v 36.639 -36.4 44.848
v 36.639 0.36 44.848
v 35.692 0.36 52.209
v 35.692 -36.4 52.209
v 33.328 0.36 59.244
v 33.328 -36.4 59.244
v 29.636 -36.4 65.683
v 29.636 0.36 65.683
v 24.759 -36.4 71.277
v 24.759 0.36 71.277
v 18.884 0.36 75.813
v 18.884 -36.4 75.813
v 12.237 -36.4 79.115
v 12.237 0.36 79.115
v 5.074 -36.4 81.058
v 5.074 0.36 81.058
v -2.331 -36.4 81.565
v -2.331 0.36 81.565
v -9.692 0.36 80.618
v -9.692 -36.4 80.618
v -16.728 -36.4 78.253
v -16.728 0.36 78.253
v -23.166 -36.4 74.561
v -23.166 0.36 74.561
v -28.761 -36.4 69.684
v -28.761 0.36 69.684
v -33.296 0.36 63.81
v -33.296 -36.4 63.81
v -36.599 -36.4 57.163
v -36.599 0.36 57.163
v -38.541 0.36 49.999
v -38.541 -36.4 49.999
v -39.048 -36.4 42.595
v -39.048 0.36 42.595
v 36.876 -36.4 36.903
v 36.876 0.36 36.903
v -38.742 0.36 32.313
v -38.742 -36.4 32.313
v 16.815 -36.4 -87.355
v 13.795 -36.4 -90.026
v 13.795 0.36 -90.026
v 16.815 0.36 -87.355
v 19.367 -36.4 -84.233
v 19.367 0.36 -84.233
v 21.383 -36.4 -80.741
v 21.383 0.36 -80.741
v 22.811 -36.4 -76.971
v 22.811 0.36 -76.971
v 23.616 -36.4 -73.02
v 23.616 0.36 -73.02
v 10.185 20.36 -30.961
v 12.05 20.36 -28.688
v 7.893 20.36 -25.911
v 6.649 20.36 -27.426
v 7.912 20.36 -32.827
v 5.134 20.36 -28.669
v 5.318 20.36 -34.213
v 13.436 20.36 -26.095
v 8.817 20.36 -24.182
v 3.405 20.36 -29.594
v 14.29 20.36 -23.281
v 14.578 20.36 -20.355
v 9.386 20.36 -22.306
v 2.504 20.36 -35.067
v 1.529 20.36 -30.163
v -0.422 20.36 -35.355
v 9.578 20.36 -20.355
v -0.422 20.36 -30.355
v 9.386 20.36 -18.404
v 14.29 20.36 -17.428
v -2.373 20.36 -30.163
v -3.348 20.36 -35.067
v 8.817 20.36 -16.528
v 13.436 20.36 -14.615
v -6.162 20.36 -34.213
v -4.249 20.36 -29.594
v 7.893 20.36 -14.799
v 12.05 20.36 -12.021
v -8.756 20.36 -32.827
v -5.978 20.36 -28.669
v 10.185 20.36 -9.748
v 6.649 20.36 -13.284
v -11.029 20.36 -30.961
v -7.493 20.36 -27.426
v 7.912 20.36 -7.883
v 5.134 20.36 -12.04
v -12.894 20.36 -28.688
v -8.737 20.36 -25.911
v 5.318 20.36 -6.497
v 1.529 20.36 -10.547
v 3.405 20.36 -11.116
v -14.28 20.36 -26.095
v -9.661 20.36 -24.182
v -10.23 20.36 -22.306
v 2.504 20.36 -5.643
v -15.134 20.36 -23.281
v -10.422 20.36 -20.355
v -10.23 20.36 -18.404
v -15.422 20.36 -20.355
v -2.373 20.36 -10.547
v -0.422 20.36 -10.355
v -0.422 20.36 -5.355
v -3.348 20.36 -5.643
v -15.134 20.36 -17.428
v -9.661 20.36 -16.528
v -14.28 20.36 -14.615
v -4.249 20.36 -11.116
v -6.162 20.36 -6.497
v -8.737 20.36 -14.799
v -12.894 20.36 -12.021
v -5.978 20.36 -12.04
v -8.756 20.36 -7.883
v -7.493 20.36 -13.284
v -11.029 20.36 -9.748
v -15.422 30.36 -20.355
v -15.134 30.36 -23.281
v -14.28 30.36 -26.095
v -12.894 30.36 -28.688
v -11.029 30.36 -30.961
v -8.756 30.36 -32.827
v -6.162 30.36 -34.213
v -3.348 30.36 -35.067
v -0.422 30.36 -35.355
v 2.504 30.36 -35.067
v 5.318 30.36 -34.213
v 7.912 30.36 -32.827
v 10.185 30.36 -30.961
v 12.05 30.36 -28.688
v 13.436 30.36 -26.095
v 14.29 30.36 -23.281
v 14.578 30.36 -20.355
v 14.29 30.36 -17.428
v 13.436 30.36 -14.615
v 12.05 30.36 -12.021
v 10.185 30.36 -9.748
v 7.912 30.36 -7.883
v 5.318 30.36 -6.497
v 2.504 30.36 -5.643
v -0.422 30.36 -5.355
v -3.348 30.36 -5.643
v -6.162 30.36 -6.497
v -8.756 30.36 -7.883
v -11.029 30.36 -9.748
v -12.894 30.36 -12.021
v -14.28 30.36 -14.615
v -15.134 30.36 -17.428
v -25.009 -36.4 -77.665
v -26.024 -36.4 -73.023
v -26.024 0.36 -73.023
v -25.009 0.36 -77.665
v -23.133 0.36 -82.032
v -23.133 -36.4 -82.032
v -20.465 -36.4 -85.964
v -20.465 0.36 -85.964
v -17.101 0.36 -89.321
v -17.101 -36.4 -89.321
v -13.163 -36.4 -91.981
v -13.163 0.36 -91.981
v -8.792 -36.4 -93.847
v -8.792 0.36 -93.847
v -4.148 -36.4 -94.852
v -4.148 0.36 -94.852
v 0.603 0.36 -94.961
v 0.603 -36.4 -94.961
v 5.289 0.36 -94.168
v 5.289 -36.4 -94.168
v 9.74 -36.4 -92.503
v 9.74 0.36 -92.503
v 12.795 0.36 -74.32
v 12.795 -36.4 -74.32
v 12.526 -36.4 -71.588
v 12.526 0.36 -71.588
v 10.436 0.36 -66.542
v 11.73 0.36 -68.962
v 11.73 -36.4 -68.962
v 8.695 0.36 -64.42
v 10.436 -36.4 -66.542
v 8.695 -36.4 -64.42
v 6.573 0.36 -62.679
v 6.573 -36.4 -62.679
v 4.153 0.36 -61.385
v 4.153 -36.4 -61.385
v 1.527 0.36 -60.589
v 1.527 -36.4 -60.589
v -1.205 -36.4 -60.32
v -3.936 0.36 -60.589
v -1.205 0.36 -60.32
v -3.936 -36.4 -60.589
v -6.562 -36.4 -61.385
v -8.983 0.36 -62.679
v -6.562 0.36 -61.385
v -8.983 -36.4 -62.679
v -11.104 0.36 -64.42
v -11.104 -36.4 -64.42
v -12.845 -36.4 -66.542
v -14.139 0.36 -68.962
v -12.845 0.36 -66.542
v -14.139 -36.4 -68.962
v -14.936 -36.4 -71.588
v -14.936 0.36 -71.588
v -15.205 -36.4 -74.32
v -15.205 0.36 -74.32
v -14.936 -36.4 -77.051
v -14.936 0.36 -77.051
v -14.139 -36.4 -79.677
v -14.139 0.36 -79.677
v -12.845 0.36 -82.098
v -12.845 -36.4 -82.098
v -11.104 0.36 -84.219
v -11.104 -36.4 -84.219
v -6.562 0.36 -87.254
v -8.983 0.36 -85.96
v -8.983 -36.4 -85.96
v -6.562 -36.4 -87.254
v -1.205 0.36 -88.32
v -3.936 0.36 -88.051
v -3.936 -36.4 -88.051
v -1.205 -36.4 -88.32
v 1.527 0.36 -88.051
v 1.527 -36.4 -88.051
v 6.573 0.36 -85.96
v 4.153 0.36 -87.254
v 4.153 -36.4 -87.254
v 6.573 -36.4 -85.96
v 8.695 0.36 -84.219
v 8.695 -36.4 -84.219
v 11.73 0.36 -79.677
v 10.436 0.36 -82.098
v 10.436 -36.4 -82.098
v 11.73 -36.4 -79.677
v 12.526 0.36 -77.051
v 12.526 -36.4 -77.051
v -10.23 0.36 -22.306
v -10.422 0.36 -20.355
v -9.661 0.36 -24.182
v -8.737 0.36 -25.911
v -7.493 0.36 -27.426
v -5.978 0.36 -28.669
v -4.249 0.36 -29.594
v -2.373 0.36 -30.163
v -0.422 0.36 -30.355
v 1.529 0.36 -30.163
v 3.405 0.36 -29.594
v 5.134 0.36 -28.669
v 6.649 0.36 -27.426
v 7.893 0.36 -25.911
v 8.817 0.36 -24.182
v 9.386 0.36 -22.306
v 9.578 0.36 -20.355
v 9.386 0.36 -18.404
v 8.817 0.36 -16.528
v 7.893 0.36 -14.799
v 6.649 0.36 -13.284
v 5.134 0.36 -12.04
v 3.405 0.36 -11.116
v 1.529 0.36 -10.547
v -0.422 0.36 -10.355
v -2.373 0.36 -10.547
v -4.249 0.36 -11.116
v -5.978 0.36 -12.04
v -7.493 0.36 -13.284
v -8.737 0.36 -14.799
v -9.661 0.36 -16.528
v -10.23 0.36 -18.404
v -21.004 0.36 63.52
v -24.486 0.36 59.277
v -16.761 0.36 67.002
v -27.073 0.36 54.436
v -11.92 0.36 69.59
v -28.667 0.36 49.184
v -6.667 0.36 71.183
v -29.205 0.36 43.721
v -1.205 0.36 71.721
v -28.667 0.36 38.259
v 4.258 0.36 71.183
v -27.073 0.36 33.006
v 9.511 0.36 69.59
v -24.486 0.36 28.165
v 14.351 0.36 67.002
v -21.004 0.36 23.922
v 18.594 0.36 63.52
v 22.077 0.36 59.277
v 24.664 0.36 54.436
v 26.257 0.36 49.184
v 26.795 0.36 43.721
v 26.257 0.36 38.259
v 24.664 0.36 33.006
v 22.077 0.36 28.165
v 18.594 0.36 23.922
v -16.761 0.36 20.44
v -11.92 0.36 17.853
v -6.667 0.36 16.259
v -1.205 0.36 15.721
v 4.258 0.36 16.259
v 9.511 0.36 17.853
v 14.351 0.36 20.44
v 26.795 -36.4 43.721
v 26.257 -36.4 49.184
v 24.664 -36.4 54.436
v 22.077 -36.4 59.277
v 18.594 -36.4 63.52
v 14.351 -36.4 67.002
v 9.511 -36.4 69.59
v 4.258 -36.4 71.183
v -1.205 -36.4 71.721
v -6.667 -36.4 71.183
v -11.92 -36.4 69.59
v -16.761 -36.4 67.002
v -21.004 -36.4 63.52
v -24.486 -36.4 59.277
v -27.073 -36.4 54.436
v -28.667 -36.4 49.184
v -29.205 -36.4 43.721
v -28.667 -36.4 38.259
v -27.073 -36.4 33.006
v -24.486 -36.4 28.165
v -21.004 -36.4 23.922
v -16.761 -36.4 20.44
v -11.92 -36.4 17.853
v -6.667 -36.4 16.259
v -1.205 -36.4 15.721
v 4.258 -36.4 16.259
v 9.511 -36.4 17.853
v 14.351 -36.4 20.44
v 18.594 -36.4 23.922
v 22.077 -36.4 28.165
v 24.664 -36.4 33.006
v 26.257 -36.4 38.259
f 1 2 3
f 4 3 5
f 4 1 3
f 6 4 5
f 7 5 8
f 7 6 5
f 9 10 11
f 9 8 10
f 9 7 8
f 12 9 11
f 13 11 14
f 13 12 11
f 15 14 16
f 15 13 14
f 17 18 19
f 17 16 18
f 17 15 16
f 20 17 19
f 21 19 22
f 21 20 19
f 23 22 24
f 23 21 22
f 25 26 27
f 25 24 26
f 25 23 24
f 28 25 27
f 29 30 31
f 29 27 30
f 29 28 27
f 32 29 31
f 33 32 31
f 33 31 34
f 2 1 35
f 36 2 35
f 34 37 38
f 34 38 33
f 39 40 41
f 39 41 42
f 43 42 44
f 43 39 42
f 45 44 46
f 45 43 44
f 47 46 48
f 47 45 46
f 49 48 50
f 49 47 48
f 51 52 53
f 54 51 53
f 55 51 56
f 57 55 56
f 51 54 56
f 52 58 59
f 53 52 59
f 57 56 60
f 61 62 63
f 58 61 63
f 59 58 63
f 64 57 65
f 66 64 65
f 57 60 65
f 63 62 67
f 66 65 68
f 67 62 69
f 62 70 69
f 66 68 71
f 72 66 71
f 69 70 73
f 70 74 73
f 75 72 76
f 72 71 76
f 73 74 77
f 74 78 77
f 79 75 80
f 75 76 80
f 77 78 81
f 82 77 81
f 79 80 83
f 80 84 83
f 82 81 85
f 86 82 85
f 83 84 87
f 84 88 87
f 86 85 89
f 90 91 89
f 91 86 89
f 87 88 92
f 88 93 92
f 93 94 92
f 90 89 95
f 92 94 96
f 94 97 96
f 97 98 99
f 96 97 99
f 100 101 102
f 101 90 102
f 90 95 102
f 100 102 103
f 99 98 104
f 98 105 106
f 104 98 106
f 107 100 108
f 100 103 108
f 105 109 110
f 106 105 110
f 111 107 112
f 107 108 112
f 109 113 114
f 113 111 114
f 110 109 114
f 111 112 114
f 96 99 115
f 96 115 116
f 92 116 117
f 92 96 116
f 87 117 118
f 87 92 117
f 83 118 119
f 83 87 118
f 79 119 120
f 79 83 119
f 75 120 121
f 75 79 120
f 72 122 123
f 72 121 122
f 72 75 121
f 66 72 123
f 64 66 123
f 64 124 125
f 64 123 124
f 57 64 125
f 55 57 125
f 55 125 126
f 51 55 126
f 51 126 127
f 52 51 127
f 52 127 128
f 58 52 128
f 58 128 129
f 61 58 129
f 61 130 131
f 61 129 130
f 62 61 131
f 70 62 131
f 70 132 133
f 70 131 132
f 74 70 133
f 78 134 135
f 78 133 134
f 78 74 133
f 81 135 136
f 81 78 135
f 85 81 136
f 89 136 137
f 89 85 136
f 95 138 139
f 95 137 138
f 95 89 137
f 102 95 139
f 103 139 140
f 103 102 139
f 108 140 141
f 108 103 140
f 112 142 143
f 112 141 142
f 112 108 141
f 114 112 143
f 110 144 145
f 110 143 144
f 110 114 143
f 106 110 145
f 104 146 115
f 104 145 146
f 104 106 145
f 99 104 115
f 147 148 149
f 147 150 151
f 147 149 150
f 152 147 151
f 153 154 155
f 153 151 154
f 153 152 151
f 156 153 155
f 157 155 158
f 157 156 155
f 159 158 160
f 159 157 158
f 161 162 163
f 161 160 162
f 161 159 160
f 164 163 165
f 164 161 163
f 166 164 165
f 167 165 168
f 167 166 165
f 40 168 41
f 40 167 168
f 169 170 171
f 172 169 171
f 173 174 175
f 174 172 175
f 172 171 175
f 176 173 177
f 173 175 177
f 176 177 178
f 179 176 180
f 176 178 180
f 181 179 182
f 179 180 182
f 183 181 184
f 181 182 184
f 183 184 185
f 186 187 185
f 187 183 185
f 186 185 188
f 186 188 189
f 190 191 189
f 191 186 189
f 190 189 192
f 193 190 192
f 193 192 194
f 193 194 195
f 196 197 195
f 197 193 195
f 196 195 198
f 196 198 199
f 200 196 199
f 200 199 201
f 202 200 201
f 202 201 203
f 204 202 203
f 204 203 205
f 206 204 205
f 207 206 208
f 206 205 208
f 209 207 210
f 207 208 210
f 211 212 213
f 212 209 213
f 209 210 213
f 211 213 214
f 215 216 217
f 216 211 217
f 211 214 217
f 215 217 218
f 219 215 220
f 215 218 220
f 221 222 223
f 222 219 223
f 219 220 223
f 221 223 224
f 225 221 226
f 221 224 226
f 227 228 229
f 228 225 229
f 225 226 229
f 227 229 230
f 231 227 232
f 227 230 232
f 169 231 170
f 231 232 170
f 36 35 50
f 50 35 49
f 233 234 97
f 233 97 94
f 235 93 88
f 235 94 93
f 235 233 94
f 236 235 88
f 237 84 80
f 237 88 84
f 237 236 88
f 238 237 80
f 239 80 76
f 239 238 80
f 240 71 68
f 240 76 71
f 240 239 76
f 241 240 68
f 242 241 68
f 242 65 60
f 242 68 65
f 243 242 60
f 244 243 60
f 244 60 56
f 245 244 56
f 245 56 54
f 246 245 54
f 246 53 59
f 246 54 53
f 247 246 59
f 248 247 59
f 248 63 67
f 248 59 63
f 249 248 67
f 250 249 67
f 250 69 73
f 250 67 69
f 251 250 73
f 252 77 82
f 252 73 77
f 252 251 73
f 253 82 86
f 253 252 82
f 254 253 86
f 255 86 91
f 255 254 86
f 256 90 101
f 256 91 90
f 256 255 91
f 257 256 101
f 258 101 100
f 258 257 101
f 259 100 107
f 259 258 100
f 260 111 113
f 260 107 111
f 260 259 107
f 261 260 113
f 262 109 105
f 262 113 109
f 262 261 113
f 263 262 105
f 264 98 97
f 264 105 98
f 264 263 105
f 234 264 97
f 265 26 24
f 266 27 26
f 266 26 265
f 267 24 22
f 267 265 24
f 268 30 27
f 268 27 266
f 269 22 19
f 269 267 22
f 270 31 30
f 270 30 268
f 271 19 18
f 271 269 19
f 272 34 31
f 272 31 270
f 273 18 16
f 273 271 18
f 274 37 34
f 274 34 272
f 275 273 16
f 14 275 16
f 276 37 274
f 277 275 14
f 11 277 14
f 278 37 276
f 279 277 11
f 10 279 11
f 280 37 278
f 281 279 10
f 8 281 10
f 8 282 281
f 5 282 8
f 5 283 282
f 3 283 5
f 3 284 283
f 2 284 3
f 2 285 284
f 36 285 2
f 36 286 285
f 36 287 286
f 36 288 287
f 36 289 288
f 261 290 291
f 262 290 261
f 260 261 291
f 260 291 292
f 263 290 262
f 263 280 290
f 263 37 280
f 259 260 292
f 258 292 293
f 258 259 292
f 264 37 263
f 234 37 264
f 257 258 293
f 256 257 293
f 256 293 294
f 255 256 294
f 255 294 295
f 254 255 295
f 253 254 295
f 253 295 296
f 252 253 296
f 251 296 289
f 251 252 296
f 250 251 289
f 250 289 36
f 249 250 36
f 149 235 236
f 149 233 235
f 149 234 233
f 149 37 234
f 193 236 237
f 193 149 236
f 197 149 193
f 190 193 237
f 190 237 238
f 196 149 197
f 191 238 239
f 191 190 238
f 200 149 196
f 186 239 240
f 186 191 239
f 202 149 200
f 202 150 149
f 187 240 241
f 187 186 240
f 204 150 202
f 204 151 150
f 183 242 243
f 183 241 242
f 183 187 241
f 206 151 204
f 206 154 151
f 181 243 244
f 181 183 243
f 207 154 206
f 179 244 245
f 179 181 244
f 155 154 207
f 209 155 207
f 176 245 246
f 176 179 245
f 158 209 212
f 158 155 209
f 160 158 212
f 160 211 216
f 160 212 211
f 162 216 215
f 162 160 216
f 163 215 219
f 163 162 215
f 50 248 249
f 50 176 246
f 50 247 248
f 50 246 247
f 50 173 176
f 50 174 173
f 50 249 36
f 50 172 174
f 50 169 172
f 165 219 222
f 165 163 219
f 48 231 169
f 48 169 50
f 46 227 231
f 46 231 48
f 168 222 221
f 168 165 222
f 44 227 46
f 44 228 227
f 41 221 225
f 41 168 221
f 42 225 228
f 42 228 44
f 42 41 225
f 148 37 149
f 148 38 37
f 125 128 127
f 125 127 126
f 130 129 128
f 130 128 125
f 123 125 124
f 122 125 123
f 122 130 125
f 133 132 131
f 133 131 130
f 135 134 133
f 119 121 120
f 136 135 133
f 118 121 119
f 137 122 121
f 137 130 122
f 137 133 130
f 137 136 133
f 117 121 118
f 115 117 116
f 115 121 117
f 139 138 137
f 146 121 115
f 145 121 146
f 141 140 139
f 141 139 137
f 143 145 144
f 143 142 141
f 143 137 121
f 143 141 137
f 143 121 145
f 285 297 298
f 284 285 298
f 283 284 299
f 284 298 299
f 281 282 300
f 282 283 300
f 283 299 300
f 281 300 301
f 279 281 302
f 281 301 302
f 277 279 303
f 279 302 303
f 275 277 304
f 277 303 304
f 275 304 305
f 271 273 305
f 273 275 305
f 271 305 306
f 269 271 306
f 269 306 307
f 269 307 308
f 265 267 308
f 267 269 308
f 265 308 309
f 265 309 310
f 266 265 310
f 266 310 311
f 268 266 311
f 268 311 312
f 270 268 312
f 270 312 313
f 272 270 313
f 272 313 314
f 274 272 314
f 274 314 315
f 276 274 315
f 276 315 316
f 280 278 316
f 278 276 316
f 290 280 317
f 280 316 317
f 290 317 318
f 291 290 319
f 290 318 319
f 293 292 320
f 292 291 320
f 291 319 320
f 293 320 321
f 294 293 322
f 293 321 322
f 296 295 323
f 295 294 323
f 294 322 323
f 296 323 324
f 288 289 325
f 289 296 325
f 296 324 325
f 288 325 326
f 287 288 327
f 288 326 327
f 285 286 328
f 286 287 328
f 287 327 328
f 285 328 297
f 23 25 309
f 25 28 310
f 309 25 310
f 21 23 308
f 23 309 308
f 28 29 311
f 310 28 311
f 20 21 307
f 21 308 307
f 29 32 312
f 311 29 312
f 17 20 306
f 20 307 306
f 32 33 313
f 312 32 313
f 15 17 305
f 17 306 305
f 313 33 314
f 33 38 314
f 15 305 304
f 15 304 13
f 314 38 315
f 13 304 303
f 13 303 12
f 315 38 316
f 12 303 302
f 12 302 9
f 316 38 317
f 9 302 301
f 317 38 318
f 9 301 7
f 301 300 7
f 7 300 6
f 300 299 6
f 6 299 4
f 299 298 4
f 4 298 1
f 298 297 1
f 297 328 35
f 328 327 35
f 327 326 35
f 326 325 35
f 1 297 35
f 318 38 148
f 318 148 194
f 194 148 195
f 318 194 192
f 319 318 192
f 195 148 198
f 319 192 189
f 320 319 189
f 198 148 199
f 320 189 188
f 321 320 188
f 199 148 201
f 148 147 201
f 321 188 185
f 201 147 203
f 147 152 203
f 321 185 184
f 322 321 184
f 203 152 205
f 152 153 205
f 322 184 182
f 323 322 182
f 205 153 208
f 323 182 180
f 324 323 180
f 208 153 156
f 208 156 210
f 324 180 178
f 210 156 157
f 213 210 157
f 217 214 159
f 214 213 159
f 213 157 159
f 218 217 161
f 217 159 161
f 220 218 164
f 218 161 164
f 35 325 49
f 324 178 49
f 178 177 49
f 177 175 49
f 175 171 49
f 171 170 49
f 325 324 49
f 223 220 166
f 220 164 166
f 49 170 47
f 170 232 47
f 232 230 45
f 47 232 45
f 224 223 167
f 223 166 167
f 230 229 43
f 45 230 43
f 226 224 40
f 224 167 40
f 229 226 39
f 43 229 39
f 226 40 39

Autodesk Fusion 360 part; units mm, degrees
sketch "Sketch1" plane through (0, 0, 0) normal (0, 1, 0) x (1, 0, 0)
  line L0 (36.8758, -36.9029) -> (23.6155, 73.0203)
  circle A0 centre (-1.2046, -43.7212) radius 28
  line L1 (-38.7425, -32.3133) -> (-39.0485, -42.5947)
  circle A1 centre (-1.2046, 74.3196) radius 14
  arc A2 (23.6155, 73.0203) -> (13.7954, 90.0262) centre (-1.2046, 70.0262) ccw
  arc A3 (13.7954, 90.0262) -> (-26.0243, 73.0229) centre (-1.2046, 70.0262) ccw
  line L2 (36.6393, -44.8476) -> (36.8758, -36.9029)
  line L3 (-38.7425, -32.3133) -> (-26.0243, 73.0229)
  arc A4 (-39.0485, -42.5947) -> (36.6393, -44.8476) centre (-1.2046, -43.7212) ccw
  dimension "d1" = 28
  dimension "d2" = 25
  dimension "d3" = 25
  dimension "d4" = 105.3362
extrude "Extrude1" add sketch "Sketch1" along normal blind 0.36
extrude "Extrude2" add 1 faces at (-27.8097, 0, -6.2933) along direction (0, -1, 0) blind 36.4
sketch "Sketch2" plane through (0, 0.36, 0) normal (0, 1, 0) x (-1, 0, 0)
  circle A0 centre (1.2046, -74.3196) radius 14
  circle A1 centre (1.2046, 43.7212) radius 28
  line L0 (38.7425, 32.3133) -> (39.0485, 42.5947)
  arc A2 (39.0485, 42.5947) -> (-36.6393, 44.8476) centre (1.2046, 43.7212) ccw
  line L1 (-36.6393, 44.8476) -> (-36.8758, 36.9029)
  line L2 (-36.8758, 36.9029) -> (-23.6155, -73.0203)
  arc A3 (-23.6155, -73.0203) -> (26.0243, -73.0229) centre (1.2046, -70.0262) ccw
  line L3 (26.0243, -73.0229) -> (38.7425, 32.3133)
  circle A4 centre (0.422, -20.3548) radius 10
  dimension "d9" = 20
extrude "Extrude3" add sketch "Sketch2" along normal blind 20 contours A4
sketch "Sketch3" plane through (0, 20.36, 0) normal (0, 1, 0) x (-1, 0, 0)
  circle A0 centre (0.422, -20.3548) radius 10
  circle A1 centre (0.422, -20.3548) radius 15
  dimension "d12" = 30
extrude "Extrude4" add sketch "Sketch3" along normal blind 10 contours A0 | A1
